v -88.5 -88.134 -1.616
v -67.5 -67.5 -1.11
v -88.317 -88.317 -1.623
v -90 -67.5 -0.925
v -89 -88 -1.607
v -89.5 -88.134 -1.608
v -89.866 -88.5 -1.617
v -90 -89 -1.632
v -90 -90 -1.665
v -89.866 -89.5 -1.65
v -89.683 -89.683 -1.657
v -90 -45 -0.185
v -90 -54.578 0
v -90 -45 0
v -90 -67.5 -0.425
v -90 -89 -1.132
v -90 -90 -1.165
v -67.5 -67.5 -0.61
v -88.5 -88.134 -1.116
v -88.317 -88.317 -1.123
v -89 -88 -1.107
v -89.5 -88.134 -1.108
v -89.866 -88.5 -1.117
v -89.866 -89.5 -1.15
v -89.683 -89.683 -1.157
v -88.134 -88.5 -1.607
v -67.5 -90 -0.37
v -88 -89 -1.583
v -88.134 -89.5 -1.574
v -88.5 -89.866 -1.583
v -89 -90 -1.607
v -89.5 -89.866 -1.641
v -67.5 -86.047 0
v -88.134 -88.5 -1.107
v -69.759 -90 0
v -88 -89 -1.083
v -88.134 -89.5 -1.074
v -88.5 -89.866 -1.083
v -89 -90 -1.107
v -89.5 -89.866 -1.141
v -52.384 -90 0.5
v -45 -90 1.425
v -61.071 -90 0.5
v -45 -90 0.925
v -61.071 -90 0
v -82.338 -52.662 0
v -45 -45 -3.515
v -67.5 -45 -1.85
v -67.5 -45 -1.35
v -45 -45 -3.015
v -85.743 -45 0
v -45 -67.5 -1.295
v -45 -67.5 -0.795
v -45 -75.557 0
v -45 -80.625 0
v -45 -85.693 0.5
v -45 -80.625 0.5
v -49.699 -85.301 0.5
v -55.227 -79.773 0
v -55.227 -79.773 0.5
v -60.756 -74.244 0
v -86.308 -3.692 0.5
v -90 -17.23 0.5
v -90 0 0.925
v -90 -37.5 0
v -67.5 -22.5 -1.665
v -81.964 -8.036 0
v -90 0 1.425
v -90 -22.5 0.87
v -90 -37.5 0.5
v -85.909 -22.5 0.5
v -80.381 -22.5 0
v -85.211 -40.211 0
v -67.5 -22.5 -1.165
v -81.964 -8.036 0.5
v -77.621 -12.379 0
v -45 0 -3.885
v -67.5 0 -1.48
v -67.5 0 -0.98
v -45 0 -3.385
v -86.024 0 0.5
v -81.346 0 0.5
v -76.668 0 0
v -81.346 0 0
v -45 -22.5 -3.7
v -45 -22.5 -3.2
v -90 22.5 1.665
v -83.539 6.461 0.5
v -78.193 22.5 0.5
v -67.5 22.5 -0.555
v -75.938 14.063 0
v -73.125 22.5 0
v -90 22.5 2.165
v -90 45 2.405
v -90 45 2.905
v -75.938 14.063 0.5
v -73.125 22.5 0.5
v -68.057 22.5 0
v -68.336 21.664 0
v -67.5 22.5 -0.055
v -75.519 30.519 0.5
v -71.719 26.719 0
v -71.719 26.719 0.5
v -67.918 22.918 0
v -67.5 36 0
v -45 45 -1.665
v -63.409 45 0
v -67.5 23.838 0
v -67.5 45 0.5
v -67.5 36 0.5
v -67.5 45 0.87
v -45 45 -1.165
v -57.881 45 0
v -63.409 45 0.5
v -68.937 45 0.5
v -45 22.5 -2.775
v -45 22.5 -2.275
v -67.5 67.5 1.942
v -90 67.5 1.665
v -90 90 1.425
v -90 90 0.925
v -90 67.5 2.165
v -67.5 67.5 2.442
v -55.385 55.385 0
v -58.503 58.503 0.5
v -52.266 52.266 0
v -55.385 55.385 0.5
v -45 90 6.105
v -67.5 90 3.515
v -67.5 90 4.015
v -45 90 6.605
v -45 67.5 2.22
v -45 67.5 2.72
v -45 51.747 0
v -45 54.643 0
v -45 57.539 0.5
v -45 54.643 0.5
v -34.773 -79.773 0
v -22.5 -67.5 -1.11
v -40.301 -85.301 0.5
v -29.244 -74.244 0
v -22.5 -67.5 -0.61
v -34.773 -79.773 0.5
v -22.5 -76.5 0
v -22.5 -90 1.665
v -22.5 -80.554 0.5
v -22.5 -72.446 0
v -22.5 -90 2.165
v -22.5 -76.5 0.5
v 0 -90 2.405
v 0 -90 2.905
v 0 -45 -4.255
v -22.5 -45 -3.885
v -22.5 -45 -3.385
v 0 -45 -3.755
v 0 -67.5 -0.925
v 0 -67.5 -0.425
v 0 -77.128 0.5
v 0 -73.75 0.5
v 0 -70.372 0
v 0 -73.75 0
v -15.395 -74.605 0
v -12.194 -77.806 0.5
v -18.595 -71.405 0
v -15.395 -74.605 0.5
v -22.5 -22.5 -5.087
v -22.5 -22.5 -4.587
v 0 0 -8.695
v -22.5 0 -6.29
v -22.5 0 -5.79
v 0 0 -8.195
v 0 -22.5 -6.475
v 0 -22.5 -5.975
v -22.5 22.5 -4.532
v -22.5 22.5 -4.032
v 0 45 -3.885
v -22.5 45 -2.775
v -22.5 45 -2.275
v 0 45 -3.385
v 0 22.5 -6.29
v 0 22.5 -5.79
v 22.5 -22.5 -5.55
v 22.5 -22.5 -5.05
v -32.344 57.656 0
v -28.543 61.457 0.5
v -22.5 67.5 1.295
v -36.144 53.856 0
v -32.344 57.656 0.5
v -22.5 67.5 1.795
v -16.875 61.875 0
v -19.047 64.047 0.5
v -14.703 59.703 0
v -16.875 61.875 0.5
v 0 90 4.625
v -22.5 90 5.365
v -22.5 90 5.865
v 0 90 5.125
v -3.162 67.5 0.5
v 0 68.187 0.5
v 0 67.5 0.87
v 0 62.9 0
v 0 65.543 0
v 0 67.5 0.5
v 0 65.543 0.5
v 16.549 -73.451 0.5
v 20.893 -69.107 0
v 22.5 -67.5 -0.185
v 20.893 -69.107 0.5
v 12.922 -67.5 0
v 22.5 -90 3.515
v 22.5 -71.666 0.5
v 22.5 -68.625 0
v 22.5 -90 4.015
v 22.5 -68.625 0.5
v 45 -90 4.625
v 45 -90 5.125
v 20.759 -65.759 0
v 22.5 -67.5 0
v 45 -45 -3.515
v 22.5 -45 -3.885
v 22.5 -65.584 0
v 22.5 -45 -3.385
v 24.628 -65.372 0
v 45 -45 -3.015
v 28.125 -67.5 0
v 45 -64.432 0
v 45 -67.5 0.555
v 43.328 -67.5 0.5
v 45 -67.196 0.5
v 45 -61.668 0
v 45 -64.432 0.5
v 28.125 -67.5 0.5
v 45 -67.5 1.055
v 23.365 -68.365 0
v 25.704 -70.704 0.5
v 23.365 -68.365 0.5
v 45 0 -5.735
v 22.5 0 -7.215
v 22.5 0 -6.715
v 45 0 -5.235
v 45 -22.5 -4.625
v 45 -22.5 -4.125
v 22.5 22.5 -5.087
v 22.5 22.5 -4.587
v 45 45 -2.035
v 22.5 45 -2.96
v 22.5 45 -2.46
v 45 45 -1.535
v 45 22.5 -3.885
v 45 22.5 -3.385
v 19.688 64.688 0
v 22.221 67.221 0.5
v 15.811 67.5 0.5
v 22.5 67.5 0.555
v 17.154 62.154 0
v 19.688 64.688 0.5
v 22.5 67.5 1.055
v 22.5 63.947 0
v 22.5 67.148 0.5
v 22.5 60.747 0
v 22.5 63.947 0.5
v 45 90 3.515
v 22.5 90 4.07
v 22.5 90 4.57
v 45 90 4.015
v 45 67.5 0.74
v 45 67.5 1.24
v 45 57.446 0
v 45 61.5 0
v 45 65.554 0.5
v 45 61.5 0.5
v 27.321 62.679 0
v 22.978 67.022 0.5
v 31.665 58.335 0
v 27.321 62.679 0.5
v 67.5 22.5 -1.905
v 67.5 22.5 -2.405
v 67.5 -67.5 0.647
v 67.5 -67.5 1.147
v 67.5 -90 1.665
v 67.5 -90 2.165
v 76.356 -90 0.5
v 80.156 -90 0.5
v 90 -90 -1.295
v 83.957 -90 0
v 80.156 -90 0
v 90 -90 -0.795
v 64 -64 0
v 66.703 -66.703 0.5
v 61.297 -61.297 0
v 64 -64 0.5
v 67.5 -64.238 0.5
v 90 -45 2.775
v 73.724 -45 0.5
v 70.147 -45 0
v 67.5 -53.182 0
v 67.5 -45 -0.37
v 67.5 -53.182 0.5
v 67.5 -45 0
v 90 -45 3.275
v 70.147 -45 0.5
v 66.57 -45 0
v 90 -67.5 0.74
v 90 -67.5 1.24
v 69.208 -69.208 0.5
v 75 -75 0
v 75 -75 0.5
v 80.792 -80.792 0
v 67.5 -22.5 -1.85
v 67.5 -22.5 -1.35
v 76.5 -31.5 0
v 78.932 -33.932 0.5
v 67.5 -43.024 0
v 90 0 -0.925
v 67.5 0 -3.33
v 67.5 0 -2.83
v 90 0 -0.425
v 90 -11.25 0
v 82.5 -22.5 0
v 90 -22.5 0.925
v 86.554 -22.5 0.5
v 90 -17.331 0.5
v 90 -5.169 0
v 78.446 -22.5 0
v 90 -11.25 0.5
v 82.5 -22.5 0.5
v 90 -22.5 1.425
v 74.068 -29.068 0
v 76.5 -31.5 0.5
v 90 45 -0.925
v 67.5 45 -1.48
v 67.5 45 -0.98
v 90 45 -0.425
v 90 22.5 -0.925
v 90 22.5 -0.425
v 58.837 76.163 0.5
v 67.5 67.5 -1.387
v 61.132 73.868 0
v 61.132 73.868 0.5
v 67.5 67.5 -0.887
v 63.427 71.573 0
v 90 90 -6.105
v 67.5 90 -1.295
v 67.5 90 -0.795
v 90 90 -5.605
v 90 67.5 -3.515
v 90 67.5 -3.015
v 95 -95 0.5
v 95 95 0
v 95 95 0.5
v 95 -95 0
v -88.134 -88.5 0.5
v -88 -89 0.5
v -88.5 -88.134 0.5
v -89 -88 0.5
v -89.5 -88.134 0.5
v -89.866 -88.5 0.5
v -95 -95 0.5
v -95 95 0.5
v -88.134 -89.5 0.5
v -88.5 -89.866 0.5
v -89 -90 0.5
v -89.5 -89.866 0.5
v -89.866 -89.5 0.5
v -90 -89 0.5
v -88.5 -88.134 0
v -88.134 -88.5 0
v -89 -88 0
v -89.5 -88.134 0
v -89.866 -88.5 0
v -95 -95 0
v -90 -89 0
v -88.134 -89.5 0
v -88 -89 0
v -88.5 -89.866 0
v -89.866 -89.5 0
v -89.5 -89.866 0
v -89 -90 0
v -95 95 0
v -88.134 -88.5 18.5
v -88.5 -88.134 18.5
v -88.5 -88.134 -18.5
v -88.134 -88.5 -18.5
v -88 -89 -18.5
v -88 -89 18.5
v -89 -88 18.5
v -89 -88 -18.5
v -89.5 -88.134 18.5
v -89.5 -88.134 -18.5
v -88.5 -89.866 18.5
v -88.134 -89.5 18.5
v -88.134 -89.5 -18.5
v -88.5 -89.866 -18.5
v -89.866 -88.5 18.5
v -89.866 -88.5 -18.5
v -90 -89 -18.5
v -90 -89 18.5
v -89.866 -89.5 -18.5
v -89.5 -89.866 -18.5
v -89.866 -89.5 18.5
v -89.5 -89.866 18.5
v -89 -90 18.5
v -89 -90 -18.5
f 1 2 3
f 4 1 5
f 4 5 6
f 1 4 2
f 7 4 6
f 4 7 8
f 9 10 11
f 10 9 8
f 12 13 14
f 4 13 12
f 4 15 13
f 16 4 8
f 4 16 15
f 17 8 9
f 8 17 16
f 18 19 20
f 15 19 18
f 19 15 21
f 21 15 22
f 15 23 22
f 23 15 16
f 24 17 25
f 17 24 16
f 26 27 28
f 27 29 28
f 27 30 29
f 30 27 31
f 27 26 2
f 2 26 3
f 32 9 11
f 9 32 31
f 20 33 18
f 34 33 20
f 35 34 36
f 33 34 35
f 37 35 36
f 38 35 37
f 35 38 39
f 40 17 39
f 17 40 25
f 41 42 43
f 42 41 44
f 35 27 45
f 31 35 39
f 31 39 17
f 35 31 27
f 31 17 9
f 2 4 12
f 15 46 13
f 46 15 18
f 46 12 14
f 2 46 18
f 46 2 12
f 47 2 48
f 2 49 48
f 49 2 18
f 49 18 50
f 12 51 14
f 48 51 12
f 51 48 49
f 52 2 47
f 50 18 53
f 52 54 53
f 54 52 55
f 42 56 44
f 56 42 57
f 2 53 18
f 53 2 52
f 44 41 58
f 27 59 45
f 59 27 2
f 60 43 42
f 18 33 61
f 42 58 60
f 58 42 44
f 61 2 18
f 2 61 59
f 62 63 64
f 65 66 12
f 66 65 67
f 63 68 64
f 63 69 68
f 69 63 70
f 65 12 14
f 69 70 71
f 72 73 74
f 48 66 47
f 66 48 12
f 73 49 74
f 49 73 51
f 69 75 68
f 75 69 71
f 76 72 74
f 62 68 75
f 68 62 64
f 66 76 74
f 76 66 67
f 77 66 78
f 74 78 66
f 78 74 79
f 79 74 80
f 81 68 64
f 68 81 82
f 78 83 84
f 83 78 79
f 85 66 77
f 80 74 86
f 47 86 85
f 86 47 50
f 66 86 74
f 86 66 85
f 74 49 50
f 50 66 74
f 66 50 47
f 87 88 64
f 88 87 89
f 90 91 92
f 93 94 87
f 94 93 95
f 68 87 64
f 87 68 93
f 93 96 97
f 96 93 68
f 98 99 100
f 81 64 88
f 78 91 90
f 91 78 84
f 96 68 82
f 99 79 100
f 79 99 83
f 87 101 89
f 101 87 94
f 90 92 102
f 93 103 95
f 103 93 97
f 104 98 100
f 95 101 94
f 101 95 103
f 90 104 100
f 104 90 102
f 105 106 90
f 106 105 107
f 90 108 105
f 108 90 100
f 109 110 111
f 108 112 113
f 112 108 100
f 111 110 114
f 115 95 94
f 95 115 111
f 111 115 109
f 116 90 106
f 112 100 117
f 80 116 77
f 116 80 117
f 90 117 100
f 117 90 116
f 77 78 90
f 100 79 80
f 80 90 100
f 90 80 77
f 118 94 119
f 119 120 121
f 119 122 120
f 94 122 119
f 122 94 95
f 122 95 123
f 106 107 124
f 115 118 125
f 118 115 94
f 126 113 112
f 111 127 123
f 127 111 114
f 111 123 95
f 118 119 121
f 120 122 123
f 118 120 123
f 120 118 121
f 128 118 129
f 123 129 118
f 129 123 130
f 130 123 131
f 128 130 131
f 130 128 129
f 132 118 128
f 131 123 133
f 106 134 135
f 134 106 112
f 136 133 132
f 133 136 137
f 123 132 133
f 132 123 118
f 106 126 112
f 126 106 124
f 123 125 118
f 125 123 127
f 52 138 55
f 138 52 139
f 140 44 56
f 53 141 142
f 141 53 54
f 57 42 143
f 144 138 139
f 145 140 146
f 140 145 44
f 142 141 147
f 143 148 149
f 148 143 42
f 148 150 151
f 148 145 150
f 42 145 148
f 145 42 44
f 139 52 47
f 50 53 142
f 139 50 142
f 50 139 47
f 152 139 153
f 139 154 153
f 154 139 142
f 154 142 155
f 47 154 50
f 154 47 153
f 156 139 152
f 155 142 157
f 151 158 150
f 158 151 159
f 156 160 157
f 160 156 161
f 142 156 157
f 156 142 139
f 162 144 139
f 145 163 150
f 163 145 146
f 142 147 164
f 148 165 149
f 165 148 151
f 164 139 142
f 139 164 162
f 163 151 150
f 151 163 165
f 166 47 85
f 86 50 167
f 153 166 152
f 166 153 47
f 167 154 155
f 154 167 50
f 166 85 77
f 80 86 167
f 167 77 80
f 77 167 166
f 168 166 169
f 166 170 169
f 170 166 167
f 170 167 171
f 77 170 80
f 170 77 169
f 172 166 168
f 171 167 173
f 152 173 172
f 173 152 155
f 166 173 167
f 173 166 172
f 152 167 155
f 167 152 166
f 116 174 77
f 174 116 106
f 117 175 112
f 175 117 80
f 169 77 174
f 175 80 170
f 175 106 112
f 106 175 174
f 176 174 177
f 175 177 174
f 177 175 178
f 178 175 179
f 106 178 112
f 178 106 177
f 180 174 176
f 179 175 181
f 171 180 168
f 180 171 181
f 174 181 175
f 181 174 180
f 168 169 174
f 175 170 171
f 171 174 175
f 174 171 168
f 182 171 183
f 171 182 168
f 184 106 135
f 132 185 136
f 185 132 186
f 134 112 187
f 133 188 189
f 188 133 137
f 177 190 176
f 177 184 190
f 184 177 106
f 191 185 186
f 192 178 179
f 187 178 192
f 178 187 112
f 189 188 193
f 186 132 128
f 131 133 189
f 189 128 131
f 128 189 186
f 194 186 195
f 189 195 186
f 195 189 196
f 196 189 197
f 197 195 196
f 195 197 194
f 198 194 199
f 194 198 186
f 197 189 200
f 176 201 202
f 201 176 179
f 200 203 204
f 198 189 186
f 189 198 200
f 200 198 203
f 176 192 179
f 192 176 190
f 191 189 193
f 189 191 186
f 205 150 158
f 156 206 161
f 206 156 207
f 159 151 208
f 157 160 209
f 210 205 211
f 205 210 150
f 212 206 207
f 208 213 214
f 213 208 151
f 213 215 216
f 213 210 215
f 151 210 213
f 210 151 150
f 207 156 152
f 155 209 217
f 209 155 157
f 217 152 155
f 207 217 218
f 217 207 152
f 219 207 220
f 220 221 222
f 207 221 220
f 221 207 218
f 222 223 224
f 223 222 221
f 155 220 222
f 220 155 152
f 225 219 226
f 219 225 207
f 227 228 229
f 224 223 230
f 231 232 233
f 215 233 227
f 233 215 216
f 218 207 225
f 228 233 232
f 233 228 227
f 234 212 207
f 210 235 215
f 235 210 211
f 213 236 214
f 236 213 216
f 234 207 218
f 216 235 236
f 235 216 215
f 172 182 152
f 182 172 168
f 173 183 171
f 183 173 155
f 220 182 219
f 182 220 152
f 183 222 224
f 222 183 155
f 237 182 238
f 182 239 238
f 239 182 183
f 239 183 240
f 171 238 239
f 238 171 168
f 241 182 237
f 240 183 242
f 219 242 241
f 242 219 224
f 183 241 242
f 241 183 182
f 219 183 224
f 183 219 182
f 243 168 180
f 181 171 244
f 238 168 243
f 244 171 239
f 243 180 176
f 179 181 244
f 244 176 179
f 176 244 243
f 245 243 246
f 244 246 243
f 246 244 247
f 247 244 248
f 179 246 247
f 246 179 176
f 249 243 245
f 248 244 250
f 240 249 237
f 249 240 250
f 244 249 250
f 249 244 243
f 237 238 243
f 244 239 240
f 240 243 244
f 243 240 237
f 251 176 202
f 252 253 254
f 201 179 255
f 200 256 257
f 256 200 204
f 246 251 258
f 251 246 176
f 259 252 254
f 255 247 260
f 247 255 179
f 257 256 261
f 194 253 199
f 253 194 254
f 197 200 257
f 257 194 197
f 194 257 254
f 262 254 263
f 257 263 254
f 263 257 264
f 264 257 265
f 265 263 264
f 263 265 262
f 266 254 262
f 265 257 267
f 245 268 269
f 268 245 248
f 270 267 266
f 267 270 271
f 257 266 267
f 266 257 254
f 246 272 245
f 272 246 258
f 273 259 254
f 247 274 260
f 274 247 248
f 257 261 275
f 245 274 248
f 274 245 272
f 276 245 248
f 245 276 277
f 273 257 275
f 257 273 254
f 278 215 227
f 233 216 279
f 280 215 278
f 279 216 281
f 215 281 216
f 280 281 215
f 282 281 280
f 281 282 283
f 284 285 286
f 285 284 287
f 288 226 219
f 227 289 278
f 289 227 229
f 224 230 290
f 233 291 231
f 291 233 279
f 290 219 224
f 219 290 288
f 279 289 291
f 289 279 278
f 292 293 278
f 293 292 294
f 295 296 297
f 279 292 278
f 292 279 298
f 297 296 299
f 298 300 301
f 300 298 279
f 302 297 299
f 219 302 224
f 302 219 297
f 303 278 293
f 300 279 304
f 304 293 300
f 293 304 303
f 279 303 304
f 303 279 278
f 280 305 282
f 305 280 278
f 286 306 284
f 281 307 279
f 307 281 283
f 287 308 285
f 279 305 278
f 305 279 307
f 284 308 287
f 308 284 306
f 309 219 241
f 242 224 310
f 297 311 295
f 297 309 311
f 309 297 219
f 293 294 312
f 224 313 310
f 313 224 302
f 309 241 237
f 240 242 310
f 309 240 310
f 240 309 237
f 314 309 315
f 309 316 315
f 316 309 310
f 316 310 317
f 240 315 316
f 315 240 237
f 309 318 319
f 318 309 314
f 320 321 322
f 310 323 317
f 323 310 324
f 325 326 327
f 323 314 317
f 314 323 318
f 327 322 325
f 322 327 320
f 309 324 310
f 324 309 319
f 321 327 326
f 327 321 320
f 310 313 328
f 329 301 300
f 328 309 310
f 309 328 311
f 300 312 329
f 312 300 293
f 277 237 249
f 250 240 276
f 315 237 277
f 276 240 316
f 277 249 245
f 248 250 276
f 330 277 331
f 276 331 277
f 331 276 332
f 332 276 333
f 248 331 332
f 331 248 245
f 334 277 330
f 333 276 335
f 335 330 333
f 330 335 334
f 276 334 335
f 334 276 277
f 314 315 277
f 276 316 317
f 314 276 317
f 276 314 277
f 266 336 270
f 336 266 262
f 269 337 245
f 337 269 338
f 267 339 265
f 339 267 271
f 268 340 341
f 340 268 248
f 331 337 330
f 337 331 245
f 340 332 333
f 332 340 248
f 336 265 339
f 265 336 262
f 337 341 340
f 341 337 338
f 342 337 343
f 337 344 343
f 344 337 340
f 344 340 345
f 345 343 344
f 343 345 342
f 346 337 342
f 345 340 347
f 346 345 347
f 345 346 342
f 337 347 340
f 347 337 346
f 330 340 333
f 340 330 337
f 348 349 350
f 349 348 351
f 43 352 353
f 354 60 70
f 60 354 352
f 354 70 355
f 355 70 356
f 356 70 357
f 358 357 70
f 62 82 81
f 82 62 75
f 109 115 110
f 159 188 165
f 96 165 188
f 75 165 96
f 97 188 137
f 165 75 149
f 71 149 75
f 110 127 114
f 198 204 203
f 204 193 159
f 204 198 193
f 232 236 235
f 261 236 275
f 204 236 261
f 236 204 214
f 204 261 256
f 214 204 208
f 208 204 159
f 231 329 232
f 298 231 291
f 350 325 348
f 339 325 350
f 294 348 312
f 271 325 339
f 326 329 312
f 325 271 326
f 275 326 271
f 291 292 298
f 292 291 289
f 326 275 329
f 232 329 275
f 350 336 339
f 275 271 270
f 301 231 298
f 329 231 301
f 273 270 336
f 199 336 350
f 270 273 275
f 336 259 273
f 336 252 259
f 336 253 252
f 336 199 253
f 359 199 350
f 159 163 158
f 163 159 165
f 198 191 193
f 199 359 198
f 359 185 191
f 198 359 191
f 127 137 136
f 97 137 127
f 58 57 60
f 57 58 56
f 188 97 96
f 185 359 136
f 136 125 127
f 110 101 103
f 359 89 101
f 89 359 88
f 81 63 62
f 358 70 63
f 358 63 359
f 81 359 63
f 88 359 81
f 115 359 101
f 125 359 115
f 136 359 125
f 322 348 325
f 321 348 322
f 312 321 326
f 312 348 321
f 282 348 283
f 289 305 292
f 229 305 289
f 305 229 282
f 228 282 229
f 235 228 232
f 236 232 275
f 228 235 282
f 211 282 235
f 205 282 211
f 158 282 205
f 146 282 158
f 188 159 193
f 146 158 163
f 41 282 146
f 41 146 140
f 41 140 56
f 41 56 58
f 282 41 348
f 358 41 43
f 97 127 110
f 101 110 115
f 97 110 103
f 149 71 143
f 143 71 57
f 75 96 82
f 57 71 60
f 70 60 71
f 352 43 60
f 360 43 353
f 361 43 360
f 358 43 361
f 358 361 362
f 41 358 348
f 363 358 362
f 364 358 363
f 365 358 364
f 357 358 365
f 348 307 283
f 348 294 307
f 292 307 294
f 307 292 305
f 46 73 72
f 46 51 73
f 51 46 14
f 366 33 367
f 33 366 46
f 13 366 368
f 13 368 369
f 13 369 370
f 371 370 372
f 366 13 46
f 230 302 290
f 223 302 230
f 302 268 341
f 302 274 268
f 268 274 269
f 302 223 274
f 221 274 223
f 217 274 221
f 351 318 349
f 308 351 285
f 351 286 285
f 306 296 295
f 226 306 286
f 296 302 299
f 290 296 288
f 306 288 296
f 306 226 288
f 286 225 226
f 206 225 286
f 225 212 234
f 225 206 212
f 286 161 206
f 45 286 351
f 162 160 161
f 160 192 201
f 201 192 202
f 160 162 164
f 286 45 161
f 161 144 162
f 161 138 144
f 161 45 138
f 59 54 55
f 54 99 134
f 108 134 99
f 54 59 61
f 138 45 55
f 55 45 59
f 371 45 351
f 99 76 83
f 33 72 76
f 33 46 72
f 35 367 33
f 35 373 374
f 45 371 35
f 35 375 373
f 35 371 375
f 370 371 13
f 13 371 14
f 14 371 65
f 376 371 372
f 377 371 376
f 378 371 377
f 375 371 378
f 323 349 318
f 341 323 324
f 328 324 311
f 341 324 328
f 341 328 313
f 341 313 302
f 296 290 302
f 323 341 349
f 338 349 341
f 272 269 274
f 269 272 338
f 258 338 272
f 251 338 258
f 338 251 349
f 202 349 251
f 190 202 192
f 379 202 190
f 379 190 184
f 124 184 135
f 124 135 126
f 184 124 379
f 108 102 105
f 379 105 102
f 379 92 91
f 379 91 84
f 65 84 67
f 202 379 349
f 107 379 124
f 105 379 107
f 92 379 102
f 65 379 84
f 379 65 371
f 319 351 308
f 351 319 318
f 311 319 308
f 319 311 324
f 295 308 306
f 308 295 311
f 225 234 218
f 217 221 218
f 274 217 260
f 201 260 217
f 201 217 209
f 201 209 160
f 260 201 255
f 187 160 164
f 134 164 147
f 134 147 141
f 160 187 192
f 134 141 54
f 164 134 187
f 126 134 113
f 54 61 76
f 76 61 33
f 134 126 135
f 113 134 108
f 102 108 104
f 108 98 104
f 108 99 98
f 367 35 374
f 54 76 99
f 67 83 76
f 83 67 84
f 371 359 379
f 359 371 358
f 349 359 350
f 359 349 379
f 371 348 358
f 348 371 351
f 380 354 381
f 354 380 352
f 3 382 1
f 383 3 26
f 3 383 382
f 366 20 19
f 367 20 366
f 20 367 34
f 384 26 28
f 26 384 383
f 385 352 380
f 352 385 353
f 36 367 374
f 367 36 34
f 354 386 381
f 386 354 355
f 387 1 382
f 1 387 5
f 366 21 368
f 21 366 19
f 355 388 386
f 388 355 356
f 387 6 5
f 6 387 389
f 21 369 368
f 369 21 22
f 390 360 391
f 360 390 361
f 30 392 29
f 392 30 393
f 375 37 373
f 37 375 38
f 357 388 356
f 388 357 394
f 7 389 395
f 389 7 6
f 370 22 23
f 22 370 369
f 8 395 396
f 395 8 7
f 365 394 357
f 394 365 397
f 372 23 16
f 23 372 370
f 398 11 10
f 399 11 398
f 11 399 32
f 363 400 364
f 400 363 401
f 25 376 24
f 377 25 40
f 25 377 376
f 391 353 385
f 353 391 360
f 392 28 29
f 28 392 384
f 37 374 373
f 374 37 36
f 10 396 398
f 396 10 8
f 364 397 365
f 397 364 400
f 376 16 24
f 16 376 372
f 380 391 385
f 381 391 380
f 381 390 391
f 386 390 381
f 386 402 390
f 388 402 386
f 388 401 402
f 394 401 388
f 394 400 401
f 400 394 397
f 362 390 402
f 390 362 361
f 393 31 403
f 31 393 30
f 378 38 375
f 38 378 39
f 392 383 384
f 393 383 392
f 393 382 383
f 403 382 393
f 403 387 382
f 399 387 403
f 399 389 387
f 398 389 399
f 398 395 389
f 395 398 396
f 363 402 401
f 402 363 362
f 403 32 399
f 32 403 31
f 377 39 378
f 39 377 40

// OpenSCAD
 /**************************************\
 *                                      *
 *   OpenSCAD Mesh Display              *
 *   by Thinkyhead - April 2017         *
 *                                      *
 *   Copy the grid output from Marlin,  *
 *   paste below as shown, and use      *
 *   OpenSCAD to see a visualization    *
 *   of your mesh.                      *
 *                                      *
 \**************************************/

$t = 0.15; // comment out during animation!
X = 0; Y = 1;
L = 0; R = 1; F = 2; B = 3;

//
// Sample Mesh - Replace with your own
//
measured_z = [
  [ -1.20, -1.13, -1.09, -1.03, -1.19 ],
  [ -1.16, -1.25, -1.27, -1.25, -1.08 ],
  [ -1.13, -1.26, -1.39, -1.31, -1.18 ],
  [ -1.09, -1.20, -1.26, -1.21, -1.18 ],
  [ -1.13, -0.99, -1.03, -1.06, -1.32 ]
];

//
// An offset to add to all points in the mesh
//
zadjust     = 0;

//
// Mesh characteristics
//
bed_size = [ 200, 200 ];

mesh_inset  = [ 10, 10, 10, 10 ]; // L, F, R, B

mesh_bounds = [
  [ mesh_inset[L], mesh_inset[F] ],
  [ bed_size[X] - mesh_inset[R], bed_size[Y] - mesh_inset[B] ]
];

mesh_size = mesh_bounds[1] - mesh_bounds[0];

                      // NOTE: Marlin meshes already subtract the probe offset
NAN         = 0;      // Z to use for un-measured points

//
// Geometry
//

max_z_scale   = 100;   // Scale at Time 0.5
min_z_scale   = 10;    // Scale at Time 0.0 and 1.0
thickness     = 0.5;   // thickness of the mesh triangles
tesselation   = 1;     // levels of tesselation from 0-2
alternation   = 2;     // direction change modulus (try it)

//
// Appearance
//

show_plane    = true;
show_labels   = true;
show_coords   = true;
arrow_length  = 5;

label_font_lg = "Arial";
label_font_sm = "Arial";
mesh_color    = [1,1,1,0.5];
plane_color   = [0.4,0.6,0.9,0.6];

//================================================ Derive useful values

big_z = max_2D(measured_z,0);
lil_z = min_2D(measured_z,0);

mean_value = (big_z + lil_z) / 2.0;

mesh_points_y = len(measured_z);
mesh_points_x = len(measured_z[0]);

xspace = mesh_size[X] / (mesh_points_x - 1);
yspace = mesh_size[Y] / (mesh_points_y - 1);

// At $t=0 and $t=1 scale will be 100%
z_scale_factor = min_z_scale + (($t > 0.5) ? 1.0 - $t : $t) * (max_z_scale - min_z_scale) * 2;

//
// Min and max recursive functions for 1D and 2D arrays
// Return the smallest or largest value in the array
//
function some_1D(b,i) = (i<len(b)-1) ? (b[i] && some_1D(b,i+1)) : b[i] != 0;
function some_2D(a,j) = (j<len(a)-1) ? some_2D(a,j+1) : some_1D(a[j], 0);
function min_1D(b,i) = (i<len(b)-1) ? min(b[i], min_1D(b,i+1)) : b[i];
function min_2D(a,j) = (j<len(a)-1) ? min_2D(a,j+1) : min_1D(a[j], 0);
function max_1D(b,i) = (i<len(b)-1) ? max(b[i], max_1D(b,i+1)) : b[i];
function max_2D(a,j) = (j<len(a)-1) ? max_2D(a,j+1) : max_1D(a[j], 0);

//
// Get the corner probe points of a grid square.
//
// Input  : x,y grid indexes
// Output : An array of the 4 corner points
//
function grid_square(x,y) = [
  [x * xspace, y * yspace, z_scale_factor * (measured_z[y][x] - mean_value)],
  [x * xspace, (y+1) * yspace, z_scale_factor * (measured_z[y+1][x] - mean_value)],
  [(x+1) * xspace, (y+1) * yspace, z_scale_factor * (measured_z[y+1][x+1] - mean_value)],
  [(x+1) * xspace, y * yspace, z_scale_factor * (measured_z[y][x+1] - mean_value)]
];

// The corner point of a grid square with Z centered on the mean
function pos(x,y,z) = [x * xspace, y * yspace, z_scale_factor * (z - mean_value)];

//
// Draw the point markers and labels
//
module point_markers(show_home=true) {
  // Mark the home position 0,0
  if (show_home)
    translate([1,1]) color([0,0,0,0.25])
      cylinder(r=1, h=z_scale_factor, center=true);

  for (x=[0:mesh_points_x-1], y=[0:mesh_points_y-1]) {
    z = measured_z[y][x] - zadjust;
    down = z < mean_value;
    xyz = pos(x, y, z);
    translate([ xyz[0], xyz[1] ]) {

      // Show the XY as well as the Z!
      if (show_coords) {
        color("black")
        translate([0,0,0.5]) {
          $fn=8;
          rotate([0,0]) {
            posx = floor(mesh_bounds[0][X] + x * xspace);
            posy = floor(mesh_bounds[0][Y] + y * yspace);
            text(str(posx, ",", posy), 2, label_font_sm, halign="center", valign="center");
          }
        }
      }

      translate([ 0, 0, xyz[2] ]) {
        // Label each point with the Z
        v = z - mean_value;
        if (show_labels) {

          color(abs(v) < 0.1 ? [0,0.5,0] : [0.25,0,0])
          translate([0,0,down?-10:10]) {

            $fn=8;
            rotate([90,0])
              text(str(z), 6, label_font_lg, halign="center", valign="center");

            if (v)
              translate([0,0,down?-6:6]) rotate([90,0])
                text(str(down || !v ? "" : "+", v), 3, label_font_sm, halign="center", valign="center");
          }
        }

        // Show an arrow pointing up or down
        if (v) {
          rotate([0, down ? 180 : 0]) translate([0,0,-1])
            cylinder(
              r1=0.5,
              r2=0.1,
              h=arrow_length, $fn=12, center=1
            );
        }
        else
          color([1,0,1,0.4]) sphere(r=1.0, $fn=20, center=1);
      }
    }
  }
}

//
// Split a square on the diagonal into
// two triangles and render them.
//
//     s : a square
//   alt : a flag to split on the other diagonal
//
module tesselated_square(s, alt=false) {
  add = [0,0,thickness];
  p1 = [
    s[0], s[1], s[2], s[3],
    s[0]+add, s[1]+add, s[2]+add, s[3]+add
  ];
  f1 = alt
      ? [ [0,1,3], [4,5,1,0], [4,7,5], [5,7,3,1], [7,4,0,3] ]
      : [ [0,1,2], [4,5,1,0], [4,6,5], [5,6,2,1], [6,4,0,2] ];
  f2 = alt
      ? [ [1,2,3], [5,6,2,1], [5,6,7], [6,7,3,2], [7,5,1,3] ]
      : [ [0,2,3], [4,6,2,0], [4,7,6], [6,7,3,2], [7,4,0,3] ];

  // Use the other diagonal
  polyhedron(points=p1, faces=f1);
  polyhedron(points=p1, faces=f2);
}

/**
 * The simplest mesh display
 */
module simple_mesh(show_plane=show_plane) {
  if (show_plane) color(plane_color) cube([mesh_size[X], mesh_size[Y], thickness]);
  color(mesh_color)
    for (x=[0:mesh_points_x-2], y=[0:mesh_points_y-2])
      tesselated_square(grid_square(x, y));
}

/**
 * Subdivide the mesh into smaller squares.
 */
module bilinear_mesh(show_plane=show_plane,tesselation=tesselation) {
  if (show_plane) color(plane_color) translate([-5,-5]) cube([mesh_size[X]+10, mesh_size[Y]+10, thickness]);

  if (some_2D(measured_z, 0)) {

    tesselation = tesselation % 4;
    color(mesh_color)
    for (x=[0:mesh_points_x-2], y=[0:mesh_points_y-2]) {
      square = grid_square(x, y);
      if (tesselation < 1) {
        tesselated_square(square,(x%alternation)-(y%alternation));
      }
      else {
        subdiv_4 = subdivided_square(square);
        if (tesselation < 2) {
          for (i=[0:3]) tesselated_square(subdiv_4[i],i%alternation);
        }
        else {
          for (i=[0:3]) {
            subdiv_16 = subdivided_square(subdiv_4[i]);
            if (tesselation < 3) {
              for (j=[0:3]) tesselated_square(subdiv_16[j],j%alternation);
            }
            else {
              for (j=[0:3]) {
                subdiv_64 = subdivided_square(subdiv_16[j]);
                if (tesselation < 4) {
                  for (k=[0:3]) tesselated_square(subdiv_64[k]);
                }
              }
            }
          }
        }
      }
    }

  }
}

//
// Subdivision helpers
//
function ctrz(a) = (a[0][2]+a[1][2]+a[3][2]+a[2][2])/4;
function avgx(a,i) = (a[i][0]+a[(i+1)%4][0])/2;
function avgy(a,i) = (a[i][1]+a[(i+1)%4][1])/2;
function avgz(a,i) = (a[i][2]+a[(i+1)%4][2])/2;

//
// Convert one square into 4, applying bilinear averaging
//
// Input  : 1 square (4 points)
// Output : An array of 4 squares
//
function subdivided_square(a) = [
  [ // SW square
    a[0],                          // SW
    [a[0][0],avgy(a,0),avgz(a,0)], // CW
    [avgx(a,1),avgy(a,0),ctrz(a)], // CC
    [avgx(a,1),a[0][1],avgz(a,3)]  // SC
  ],
  [ // NW square
    [a[0][0],avgy(a,0),avgz(a,0)], // CW
    a[1],                          // NW
    [avgx(a,1),a[1][1],avgz(a,1)], // NC
    [avgx(a,1),avgy(a,0),ctrz(a)]  // CC
  ],
  [ // NE square
    [avgx(a,1),avgy(a,0),ctrz(a)], // CC
    [avgx(a,1),a[1][1],avgz(a,1)], // NC
    a[2],                          // NE
    [a[2][0],avgy(a,0),avgz(a,2)]  // CE
  ],
  [ // SE square
    [avgx(a,1),a[0][1],avgz(a,3)], // SC
    [avgx(a,1),avgy(a,0),ctrz(a)], // CC
    [a[2][0],avgy(a,0),avgz(a,2)], // CE
    a[3]                           // SE
  ]
];


//================================================ Run the plan

translate([-mesh_size[X] / 2, -mesh_size[Y] / 2]) {
  $fn = 12;
  point_markers();
  bilinear_mesh();
}
